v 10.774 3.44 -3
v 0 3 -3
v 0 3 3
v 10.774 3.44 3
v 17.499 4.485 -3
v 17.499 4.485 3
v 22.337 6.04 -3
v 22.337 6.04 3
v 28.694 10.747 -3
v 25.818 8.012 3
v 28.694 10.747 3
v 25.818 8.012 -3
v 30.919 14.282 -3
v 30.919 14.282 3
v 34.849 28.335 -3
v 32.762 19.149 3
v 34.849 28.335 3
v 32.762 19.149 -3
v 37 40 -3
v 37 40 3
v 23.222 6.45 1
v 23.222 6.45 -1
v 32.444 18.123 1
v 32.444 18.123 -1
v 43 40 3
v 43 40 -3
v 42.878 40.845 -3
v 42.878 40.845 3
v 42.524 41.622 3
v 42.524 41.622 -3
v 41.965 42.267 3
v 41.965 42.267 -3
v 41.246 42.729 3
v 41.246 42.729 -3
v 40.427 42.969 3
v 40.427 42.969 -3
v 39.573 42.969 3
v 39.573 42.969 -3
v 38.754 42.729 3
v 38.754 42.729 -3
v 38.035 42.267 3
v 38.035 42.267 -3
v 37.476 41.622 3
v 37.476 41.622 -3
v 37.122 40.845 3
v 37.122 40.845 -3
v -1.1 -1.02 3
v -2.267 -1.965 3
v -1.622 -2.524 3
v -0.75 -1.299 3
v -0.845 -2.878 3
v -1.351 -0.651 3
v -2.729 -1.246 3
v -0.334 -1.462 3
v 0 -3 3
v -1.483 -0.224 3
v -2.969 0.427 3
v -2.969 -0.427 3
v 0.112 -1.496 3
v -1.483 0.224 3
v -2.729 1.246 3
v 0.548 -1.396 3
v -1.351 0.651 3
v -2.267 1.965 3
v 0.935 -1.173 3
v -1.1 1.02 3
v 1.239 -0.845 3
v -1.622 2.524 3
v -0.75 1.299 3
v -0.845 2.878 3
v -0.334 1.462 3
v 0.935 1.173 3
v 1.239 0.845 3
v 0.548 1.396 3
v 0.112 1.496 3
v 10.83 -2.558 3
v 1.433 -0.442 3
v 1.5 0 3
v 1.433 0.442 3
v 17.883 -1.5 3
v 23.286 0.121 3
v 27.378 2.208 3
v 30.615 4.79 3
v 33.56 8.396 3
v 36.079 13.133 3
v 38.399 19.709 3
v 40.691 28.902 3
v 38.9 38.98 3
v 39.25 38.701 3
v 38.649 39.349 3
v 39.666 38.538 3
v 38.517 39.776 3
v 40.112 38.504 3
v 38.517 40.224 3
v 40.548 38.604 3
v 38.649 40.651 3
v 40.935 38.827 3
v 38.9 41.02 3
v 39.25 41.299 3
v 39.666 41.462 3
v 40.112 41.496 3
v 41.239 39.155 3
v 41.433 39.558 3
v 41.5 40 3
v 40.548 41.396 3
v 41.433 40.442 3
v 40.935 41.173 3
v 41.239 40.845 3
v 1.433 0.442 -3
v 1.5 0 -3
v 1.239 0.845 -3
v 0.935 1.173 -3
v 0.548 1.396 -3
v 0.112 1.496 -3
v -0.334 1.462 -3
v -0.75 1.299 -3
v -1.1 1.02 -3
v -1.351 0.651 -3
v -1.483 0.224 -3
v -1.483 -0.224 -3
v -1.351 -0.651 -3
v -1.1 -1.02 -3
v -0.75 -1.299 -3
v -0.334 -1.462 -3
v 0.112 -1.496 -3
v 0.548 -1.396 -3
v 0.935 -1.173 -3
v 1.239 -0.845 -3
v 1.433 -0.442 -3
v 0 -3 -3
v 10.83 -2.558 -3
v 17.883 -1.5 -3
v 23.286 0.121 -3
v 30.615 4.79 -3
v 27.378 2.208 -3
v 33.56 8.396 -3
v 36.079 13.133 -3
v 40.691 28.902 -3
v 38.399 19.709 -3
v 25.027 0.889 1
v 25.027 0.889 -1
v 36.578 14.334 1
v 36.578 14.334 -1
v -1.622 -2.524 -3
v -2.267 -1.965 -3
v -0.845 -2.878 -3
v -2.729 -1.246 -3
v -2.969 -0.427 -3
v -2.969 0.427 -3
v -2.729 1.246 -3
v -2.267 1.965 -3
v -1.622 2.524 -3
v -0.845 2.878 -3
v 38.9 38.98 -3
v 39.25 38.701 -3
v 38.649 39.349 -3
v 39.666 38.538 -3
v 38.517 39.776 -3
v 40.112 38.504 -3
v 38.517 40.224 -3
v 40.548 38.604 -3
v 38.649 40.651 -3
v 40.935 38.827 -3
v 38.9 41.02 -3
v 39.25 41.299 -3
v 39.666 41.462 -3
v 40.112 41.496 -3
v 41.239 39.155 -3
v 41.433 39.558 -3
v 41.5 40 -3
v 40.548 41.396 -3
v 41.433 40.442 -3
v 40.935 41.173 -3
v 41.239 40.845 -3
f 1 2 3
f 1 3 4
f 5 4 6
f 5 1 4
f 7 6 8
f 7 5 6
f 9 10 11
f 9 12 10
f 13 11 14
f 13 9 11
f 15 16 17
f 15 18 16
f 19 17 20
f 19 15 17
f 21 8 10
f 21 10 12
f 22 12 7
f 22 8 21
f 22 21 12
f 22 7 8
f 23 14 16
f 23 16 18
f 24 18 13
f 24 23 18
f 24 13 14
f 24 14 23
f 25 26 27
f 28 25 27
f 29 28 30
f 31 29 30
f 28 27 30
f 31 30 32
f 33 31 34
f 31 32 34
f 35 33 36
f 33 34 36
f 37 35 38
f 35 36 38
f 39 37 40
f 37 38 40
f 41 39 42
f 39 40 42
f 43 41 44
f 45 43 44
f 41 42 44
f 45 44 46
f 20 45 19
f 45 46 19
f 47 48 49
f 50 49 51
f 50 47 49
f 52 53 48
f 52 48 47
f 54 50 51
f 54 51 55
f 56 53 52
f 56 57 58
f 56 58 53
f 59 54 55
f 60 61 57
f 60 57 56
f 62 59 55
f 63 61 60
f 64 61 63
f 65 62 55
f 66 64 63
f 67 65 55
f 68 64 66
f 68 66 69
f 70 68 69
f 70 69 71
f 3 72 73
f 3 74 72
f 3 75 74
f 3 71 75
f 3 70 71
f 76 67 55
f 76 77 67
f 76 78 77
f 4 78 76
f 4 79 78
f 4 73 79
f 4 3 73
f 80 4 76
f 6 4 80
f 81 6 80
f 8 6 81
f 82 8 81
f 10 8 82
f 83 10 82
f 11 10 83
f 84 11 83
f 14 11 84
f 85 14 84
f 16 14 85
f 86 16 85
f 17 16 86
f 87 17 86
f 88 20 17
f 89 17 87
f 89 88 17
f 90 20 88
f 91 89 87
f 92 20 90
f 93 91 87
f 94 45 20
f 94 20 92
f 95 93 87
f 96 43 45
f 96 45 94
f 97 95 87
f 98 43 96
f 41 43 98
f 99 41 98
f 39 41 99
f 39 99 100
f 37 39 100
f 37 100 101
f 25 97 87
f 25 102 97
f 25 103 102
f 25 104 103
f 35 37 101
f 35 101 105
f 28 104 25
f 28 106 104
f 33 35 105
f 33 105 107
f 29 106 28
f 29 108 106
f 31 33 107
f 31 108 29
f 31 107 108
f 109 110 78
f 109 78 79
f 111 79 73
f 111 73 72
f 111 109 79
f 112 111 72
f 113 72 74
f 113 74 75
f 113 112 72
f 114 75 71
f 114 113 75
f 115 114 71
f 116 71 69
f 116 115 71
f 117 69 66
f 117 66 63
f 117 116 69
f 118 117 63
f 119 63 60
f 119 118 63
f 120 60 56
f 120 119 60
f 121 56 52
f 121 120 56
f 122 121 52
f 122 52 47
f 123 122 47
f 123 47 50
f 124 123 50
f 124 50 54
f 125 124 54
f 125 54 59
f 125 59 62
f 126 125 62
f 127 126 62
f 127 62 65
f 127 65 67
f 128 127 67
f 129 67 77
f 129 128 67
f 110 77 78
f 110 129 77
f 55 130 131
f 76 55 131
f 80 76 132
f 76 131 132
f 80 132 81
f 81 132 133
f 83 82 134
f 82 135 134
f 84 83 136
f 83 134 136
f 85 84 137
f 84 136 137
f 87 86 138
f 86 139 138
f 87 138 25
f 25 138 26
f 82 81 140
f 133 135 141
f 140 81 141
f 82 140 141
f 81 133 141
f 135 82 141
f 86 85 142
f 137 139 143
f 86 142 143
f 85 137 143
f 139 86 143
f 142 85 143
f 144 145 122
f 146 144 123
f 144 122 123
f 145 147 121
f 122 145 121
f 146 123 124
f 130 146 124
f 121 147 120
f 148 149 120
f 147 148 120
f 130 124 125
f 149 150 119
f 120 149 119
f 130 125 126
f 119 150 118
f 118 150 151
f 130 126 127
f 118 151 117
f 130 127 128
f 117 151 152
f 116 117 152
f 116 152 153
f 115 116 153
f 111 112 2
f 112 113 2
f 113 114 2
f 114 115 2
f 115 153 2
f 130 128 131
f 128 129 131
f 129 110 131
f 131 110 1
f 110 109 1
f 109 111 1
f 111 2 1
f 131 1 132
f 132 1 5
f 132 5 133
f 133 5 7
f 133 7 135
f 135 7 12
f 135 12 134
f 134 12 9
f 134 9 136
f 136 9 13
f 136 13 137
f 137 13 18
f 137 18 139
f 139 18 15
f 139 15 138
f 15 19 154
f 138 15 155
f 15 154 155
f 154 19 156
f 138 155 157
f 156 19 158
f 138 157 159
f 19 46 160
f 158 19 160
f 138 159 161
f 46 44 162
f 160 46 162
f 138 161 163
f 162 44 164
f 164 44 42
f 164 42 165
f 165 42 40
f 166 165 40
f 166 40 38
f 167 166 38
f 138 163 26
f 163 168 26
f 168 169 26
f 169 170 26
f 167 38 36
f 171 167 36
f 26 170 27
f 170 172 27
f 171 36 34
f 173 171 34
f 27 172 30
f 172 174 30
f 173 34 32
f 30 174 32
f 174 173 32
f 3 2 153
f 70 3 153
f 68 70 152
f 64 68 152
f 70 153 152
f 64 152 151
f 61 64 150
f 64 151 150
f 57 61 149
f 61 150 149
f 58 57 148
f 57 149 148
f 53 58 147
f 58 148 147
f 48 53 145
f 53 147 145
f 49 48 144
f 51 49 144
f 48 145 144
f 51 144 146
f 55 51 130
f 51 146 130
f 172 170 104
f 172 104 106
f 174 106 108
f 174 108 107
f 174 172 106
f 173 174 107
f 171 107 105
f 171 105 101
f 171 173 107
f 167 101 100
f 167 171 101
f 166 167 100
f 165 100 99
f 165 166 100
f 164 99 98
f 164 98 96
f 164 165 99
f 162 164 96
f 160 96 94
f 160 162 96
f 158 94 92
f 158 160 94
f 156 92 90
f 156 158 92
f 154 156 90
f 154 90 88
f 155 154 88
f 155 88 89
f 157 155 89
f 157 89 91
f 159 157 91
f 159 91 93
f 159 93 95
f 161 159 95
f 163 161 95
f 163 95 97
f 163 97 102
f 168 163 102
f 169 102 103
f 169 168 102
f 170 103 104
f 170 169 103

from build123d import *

# Parameters (mm, degrees)
BOSS_EXTRU_1_DEPTH      = 3
BOSS_EXTRU_1_DEPTH_BACK = 3
ESQUISSE1_R             = 1.5


with BuildPart() as part:
    # Esquisse1 → Boss.-Extru.1 (new, two sides: drawn at the far end of the back side and taken through both)
    with BuildSketch(Plane.XY.offset(-BOSS_EXTRU_1_DEPTH_BACK)):
        with BuildLine():
            ThreePointArc((0, 3), (-3, 0), (0, -3))
            add(Edge.make_bspline(
                [(0, -3), (34.547376403, -3), (36.359532073, 7.334799912), (43, 40)],
                knots=[0, 0, 0, 0, 1, 1, 1, 1], degree=3))
            ThreePointArc((43, 40), (40, 43), (37, 40))
            add(Edge.make_bspline(
                [(0, 3), (33.333333333, 3), (31.664729171, 12.359061598), (37, 40)],
                knots=[0, 0, 0, 0, 1, 1, 1, 1], degree=3))
        make_face()
        Circle(ESQUISSE1_R, mode=Mode.SUBTRACT)
        with Locations((40, 40)):
            Circle(ESQUISSE1_R, mode=Mode.SUBTRACT)
    extrude(amount=BOSS_EXTRU_1_DEPTH + BOSS_EXTRU_1_DEPTH_BACK)


solid = part.part
